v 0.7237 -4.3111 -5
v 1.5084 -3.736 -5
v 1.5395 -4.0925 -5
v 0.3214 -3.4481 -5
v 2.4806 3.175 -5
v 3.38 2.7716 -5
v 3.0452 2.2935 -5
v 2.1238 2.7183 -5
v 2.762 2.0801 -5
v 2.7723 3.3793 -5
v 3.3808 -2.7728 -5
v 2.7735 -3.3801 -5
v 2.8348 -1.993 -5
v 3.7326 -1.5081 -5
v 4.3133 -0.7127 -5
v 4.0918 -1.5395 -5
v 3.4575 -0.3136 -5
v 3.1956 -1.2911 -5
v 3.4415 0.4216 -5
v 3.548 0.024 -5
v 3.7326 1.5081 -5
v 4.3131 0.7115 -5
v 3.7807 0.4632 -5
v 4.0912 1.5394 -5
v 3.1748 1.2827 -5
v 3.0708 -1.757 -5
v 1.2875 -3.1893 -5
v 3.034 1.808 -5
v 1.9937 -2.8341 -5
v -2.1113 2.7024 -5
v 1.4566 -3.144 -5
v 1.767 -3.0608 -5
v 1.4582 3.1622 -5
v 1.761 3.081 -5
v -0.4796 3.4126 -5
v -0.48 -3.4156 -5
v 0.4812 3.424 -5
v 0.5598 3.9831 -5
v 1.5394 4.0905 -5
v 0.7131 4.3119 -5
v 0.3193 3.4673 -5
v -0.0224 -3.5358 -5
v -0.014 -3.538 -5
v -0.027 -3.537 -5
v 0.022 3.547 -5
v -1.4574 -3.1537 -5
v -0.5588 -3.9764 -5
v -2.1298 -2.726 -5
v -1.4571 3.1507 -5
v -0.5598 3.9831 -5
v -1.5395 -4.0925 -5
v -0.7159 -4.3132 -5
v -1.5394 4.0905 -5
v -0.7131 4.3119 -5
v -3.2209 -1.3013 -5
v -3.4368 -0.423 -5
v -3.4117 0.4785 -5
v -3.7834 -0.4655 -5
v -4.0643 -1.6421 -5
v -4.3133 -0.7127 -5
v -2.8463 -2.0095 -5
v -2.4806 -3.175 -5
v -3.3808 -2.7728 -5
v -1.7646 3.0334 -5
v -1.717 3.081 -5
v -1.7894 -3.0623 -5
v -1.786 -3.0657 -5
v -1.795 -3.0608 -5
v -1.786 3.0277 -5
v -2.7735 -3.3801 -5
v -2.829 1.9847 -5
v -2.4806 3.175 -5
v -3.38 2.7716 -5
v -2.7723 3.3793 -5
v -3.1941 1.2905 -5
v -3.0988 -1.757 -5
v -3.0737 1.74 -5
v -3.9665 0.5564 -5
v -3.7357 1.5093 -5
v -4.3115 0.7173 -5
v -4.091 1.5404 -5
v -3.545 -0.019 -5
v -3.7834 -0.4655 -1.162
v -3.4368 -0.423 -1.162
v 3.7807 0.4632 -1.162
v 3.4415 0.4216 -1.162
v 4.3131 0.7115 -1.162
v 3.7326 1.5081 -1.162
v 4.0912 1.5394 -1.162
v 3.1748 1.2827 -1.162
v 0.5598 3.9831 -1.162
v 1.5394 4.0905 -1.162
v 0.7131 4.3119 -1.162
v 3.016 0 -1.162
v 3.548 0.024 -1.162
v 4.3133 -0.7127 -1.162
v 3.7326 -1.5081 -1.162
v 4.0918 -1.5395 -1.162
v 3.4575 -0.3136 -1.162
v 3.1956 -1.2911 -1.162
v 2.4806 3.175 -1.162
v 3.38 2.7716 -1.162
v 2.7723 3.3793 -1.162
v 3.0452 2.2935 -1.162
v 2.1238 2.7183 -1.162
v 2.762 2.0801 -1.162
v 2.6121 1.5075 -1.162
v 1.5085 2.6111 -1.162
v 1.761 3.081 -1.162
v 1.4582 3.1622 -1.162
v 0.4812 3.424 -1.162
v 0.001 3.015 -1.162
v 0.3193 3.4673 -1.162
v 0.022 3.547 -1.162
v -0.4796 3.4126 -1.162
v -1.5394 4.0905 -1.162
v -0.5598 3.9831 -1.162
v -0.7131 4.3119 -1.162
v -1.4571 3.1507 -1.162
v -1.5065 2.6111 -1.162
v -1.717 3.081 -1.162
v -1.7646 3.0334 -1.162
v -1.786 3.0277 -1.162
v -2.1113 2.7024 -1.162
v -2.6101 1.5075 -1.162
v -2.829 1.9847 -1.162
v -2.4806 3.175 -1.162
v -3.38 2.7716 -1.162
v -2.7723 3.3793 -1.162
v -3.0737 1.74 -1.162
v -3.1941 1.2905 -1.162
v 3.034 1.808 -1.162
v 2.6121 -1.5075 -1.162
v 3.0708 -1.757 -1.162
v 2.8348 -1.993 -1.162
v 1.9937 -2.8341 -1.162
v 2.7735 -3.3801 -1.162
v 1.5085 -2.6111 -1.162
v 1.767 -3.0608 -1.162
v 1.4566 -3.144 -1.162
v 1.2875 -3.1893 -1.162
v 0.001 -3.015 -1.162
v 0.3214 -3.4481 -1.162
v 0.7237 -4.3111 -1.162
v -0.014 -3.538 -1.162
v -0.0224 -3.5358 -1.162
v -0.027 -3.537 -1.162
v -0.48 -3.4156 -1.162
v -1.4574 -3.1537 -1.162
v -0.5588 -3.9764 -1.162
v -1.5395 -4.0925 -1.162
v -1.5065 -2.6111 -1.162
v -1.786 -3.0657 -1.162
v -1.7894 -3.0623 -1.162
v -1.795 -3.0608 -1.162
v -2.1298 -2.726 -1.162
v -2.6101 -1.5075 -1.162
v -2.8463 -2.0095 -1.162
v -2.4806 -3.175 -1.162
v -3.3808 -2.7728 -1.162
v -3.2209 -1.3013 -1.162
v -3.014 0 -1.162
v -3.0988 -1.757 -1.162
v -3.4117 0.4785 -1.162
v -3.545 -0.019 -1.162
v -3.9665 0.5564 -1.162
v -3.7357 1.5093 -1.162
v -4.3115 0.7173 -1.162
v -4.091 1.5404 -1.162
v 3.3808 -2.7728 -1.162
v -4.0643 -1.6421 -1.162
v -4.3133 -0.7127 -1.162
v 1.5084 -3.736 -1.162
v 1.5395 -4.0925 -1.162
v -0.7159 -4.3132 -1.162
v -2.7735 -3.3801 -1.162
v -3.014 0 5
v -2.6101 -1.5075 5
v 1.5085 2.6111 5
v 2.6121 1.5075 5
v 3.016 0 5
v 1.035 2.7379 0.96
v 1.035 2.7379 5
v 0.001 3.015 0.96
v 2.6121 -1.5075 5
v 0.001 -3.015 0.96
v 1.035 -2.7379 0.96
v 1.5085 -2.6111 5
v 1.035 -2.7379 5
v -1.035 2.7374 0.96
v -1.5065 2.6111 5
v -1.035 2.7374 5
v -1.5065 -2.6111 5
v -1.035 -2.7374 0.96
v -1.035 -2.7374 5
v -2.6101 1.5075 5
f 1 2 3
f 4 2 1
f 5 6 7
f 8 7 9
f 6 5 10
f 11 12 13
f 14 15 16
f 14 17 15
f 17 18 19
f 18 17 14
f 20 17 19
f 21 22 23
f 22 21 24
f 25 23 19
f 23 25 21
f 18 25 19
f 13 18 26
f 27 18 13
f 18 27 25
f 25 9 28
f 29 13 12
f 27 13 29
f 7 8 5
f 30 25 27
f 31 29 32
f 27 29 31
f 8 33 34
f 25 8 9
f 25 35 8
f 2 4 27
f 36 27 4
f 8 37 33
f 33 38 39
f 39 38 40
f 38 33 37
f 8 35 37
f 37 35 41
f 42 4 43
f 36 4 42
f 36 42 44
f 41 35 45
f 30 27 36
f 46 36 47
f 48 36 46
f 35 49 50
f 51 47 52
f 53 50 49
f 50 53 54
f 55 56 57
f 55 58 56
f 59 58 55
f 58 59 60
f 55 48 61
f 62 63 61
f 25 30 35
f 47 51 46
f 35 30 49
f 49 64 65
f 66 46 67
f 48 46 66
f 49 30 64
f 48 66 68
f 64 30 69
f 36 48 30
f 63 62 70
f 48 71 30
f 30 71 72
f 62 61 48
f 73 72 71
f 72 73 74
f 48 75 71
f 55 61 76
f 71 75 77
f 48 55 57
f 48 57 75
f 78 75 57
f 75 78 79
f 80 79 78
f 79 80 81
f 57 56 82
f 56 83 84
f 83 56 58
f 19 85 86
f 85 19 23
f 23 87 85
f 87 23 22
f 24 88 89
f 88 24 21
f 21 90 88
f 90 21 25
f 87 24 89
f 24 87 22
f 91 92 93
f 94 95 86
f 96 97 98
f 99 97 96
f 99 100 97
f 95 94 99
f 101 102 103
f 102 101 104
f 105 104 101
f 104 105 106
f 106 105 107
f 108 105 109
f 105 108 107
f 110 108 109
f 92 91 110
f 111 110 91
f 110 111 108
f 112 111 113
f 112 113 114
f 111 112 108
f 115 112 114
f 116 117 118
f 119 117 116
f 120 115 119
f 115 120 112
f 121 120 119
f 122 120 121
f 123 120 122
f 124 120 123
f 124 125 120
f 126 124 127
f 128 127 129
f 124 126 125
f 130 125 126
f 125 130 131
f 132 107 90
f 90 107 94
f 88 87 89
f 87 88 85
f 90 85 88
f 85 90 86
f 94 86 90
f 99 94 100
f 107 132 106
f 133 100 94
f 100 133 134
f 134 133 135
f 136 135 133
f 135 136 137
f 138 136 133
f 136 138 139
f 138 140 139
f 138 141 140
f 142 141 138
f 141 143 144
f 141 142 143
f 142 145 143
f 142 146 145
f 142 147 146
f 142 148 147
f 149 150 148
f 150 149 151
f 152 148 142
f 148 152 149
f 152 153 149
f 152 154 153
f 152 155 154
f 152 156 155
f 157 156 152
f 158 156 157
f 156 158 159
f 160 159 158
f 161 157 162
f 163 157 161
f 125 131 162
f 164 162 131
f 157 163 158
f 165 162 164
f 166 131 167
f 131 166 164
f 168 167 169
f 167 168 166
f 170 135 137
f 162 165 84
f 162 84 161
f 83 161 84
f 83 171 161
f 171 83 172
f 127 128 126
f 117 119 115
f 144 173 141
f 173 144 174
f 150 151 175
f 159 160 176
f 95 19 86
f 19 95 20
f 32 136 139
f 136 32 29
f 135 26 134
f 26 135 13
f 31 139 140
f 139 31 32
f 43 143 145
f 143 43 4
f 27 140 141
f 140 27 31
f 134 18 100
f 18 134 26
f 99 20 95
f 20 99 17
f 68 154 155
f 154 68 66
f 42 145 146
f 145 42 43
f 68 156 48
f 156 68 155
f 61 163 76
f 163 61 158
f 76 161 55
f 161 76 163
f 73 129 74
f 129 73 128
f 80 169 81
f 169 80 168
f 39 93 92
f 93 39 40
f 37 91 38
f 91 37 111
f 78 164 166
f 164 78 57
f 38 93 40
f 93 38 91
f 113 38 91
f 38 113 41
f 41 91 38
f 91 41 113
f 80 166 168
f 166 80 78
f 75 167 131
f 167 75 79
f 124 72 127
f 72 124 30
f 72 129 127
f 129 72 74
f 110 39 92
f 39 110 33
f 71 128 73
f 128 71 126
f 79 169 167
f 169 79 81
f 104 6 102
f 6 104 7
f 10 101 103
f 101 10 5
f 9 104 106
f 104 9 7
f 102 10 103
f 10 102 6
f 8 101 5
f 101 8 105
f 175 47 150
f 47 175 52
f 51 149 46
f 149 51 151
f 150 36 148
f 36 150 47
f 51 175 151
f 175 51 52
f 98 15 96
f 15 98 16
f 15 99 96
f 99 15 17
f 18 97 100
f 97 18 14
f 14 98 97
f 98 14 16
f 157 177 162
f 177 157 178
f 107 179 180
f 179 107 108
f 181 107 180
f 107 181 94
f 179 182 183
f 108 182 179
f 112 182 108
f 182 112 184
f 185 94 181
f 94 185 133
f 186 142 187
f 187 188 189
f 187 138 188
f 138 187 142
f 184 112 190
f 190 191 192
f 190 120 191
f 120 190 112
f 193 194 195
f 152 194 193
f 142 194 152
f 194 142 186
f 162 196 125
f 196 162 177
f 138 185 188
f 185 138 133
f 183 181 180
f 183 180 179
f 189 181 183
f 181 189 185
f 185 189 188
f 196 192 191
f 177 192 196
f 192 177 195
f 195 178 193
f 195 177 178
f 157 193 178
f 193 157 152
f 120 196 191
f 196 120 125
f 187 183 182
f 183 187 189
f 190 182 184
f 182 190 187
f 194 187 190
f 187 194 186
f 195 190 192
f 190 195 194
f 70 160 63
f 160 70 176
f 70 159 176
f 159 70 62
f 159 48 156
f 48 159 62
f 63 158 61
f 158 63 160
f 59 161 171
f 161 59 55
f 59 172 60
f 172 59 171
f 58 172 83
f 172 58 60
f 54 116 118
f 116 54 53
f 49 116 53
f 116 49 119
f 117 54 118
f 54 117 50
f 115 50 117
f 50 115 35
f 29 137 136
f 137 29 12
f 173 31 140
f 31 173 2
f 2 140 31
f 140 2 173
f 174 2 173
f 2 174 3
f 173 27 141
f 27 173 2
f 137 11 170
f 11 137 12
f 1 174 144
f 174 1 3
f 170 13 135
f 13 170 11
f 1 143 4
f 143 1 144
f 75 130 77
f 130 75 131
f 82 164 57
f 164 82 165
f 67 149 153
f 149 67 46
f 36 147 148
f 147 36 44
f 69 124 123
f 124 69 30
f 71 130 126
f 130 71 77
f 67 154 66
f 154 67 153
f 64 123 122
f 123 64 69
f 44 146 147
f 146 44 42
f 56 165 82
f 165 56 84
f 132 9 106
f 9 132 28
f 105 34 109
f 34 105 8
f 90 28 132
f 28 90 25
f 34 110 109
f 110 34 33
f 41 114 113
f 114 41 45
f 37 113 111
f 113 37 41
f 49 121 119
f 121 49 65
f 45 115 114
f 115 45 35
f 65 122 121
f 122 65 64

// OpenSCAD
intersection() {
translate([-5.326, -5.326, -6]) cube(size = [10.652, 10.652, 12], center = false);
union() {
intersection() {
union() {
difference() {
translate([0, 0, 0]) sphere(r = 54.3, $fn = 12);
rotate([-180, 0, 7])
translate([-18.1, -18.1, -18.1]) cube(size = [36.2, 18.101, 23.1], center = false);
}
intersection() {
rotate([-180, 0, 25])
translate([-18.1, -18.1, -18.1]) cube(size = [36.2, 19.278, 23.1], center = false);
rotate([-180, 0, 5])
translate([-18.1, -1.177, -18.1]) cube(size = [36.2, 19.278, 36.2], center = false);
}
}
union() {
intersection() {
rotate([-180, 0, 22])
translate([-18.1, 0, -18.1]) cube(size = [36.2, 18.1, 36.2], center = false);
translate([0, -0.001, -5])
cylinder(h = 3.838, r1 = 4.504, r2 = 4.504, center = false, $fn = 12);
}
rotate([-180, 0, 7])
translate([-18.1, 0.001, 1.162]) cube(size = [36.2, 18.099, 3.838], center = false);
}
union() {
difference() {
translate([0, -0.001, -18.1])
cylinder(h = 13.1, r1 = 4.504, r2 = 4.504, center = false, $fn = 12);
translate([0, 0, 0]) sphere(r = 54.3, $fn = 12);
}
intersection() {
translate([-0.014, 0.024, -5])
cylinder(h = 3.838, r1 = 3.562, r2 = 3.562, center = false, $fn = 12);
translate([0, -0.001, -18.1])
cylinder(h = 36.2, r1 = 4.504, r2 = 4.504, center = false, $fn = 12);
}
difference() {
translate([0, -0.001, -18.1])
cylinder(h = 16.938, r1 = 4.504, r2 = 4.504, center = false, $fn = 12);
rotate([-180, 0, 7])
translate([-18.1, 0.001, -18.1]) cube(size = [36.2, 18.099, 36.2], center = false);
}
}
}
intersection() {
difference() {
difference() {
translate([0, -0.001, -5])
cylinder(h = 3.838, r1 = 4.504, r2 = 4.504, center = false, $fn = 12);
translate([5.775, 1.548, -18.1])
cylinder(h = 16.938, r1 = 4.744, r2 = 4.744, center = false, $fn = 12);
}
difference() {
rotate([0, 0, -8])
translate([-18.1, -0.001, -5]) cube(size = [18.1, 18.101, 3.838], center = false);
rotate([0, 0, -25])
translate([-18.1, -1.172, -5]) cube(size = [16.924, 19.272, 3.838], center = false);
}
}
difference() {
union() {
difference() {
translate([-9.487, -0.001, -5])
cylinder(h = 3.838, r1 = 8.765, r2 = 8.765, center = false, $fn = 12);
translate([-8.309, -4.804, -5])
cylinder(h = 3.838, r1 = 8.869, r2 = 8.869, center = false, $fn = 12);
}
rotate([0, 0, -22])
translate([-18.1, -18.1, -18.1]) cube(size = [36.2, 18.1, 16.938], center = false);
rotate([0, 0, -25])
translate([-1.176, -1.172, -18.1]) cube(size = [19.276, 19.272, 16.938], center = false);
}
union() {
intersection() {
rotate([-180, 0, 38])
translate([0, -18.1, -18.1]) cube(size = [18.1, 36.2, 23.1], center = false);
translate([-9.487, -0.001, -5])
cylinder(h = 23.1, r1 = 8.765, r2 = 8.765, center = false, $fn = 12);
}
intersection() {
rotate([0, 0, -35])
translate([-18.1, 1.178, -5]) cube(size = [36.2, 16.922, 23.1], center = false);
rotate([-180, 0, 5])
translate([-18.1, -18.1, 1.162]) cube(size = [16.923, 36.2, 3.838], center = false);
}
}
}
union() {
intersection() {
rotate([0, 0, -5])
translate([-18.1, -18.1, -18.1]) cube(size = [19.277, 36.2, 16.938], center = false);
rotate([-180, 0, 35])
translate([-1.179, -18.1, 1.162]) cube(size = [19.279, 36.2, 3.838], center = false);
}
intersection() {
rotate([0, 0, -8])
translate([-18.1, -0.001, -18.1]) cube(size = [18.1, 18.101, 36.2], center = false);
rotate([0, 0, -5])
translate([-18.1, -18.1, -5]) cube(size = [19.277, 19.278, 23.1], center = false);
}
}
}
translate([-0.027, -0.019, -5])
cylinder(h = 3.838, r1 = 3.518, r2 = 3.518, center = false, $fn = 12);
intersection() {
rotate([0, 0, -38])
translate([0, -18.1, -5]) cube(size = [18.1, 36.2, 3.838], center = false);
difference() {
translate([0, -0.001, -5])
cylinder(h = 3.838, r1 = 4.504, r2 = 4.504, center = false, $fn = 12);
union() {
rotate([0, 0, -35])
translate([1.179, -18.1, -18.1]) cube(size = [16.921, 36.2, 36.2], center = false);
rotate([-180, 0, 35])
translate([-18.1, -18.1, -18.1]) cube(size = [36.2, 16.922, 36.2], center = false);
rotate([-180, 0, 37])
translate([-18.1, 0.001, 1.162]) cube(size = [36.2, 18.099, 3.838], center = false);
}
}
}
intersection() {
difference() {
difference() {
rotate([0, 0, -25])
translate([-18.1, -18.1, -5]) cube(size = [19.274, 19.277, 3.838], center = false);
rotate([0, 0, -5])
translate([-18.1, -18.1, -18.1]) cube(size = [16.923, 36.2, 36.2], center = false);
}
union() {
translate([-9.487, -0.001, -18.1])
cylinder(h = 16.938, r1 = 8.765, r2 = 8.765, center = false, $fn = 12);
rotate([0, 0, -8])
translate([0, -18.1, -5]) cube(size = [18.1, 36.2, 23.1], center = false);
}
}
translate([0, -0.001, -5])
cylinder(h = 23.1, r1 = 4.504, r2 = 4.504, center = false, $fn = 12);
}
intersection() {
rotate([0, 0, -22])
translate([-18.1, 0, -18.1]) cube(size = [36.2, 18.1, 36.2], center = false);
difference() {
difference() {
translate([0, -0.001, -5])
cylinder(h = 3.838, r1 = 4.504, r2 = 4.504, center = false, $fn = 12);
rotate([0, 0, -25])
translate([-18.1, 1.177, -18.1]) cube(size = [36.2, 16.923, 36.2], center = false);
}
difference() {
rotate([0, 0, -35])
translate([-18.1, -1.178, -5]) cube(size = [36.2, 19.278, 3.838], center = false);
rotate([-180, 0, 5])
translate([1.177, -18.1, 1.162]) cube(size = [16.923, 36.2, 16.938], center = false);
}
}
rotate([0, 0, -5])
translate([-18.1, -1.177, -5]) cube(size = [36.2, 19.278, 23.1], center = false);
}
difference() {
translate([0.001, 0, -1.162])
cylinder(h = 6.162, r1 = 3.015, r2 = 3.015, center = false, $fn = 12);
translate([-1.035, -18.1, 0.96]) cube(size = [2.07, 36.2, 17.14], center = false);
}
difference() {
translate([0, -0.001, -5])
cylinder(h = 3.838, r1 = 4.504, r2 = 4.504, center = false, $fn = 12);
difference() {
union() {
rotate([-180, 0, 5])
translate([-18.1, -18.1, -18.1]) cube(size = [36.2, 19.278, 23.1], center = false);
intersection() {
translate([0, -0.001, -18.1])
cylinder(h = 36.2, r1 = 4.504, r2 = 4.504, center = false, $fn = 12);
rotate([-180, 0, 35])
translate([-18.1, 1.178, -18.1]) cube(size = [36.2, 16.922, 36.2], center = false);
}
rotate([0, 0, -38])
translate([0, -18.1, -5]) cube(size = [18.1, 36.2, 23.1], center = false);
rotate([0, 0, -35])
translate([-18.1, -18.1, -18.1]) cube(size = [16.921, 36.2, 36.2], center = false);
}
intersection() {
rotate([-180, 0, 22])
translate([-18.1, -18.1, 1.162]) cube(size = [36.2, 18.1, 3.838], center = false);
rotate([-180, 0, 7])
translate([-18.1, 0.001, -18.1]) cube(size = [36.2, 18.099, 36.2], center = false);
rotate([-180, 0, 7])
translate([-18.1, 0.001, -18.1]) cube(size = [36.2, 18.099, 23.1], center = false);
translate([0, -0.001, -18.1])
cylinder(h = 16.938, r1 = 4.504, r2 = 4.504, center = false, $fn = 12);
rotate([-180, 0, 25])
translate([-18.1, -1.177, -18.1]) cube(size = [36.2, 19.278, 36.2], center = false);
}
}
}
difference() {
intersection() {
difference() {
translate([0, -0.001, -5])
cylinder(h = 3.838, r1 = 4.504, r2 = 4.504, center = false, $fn = 12);
rotate([0, 0, -8])
translate([-18.1, -18.1, -18.1]) cube(size = [36.2, 18.099, 36.2], center = false);
}
rotate([-180, 0, 25])
translate([-18.1, -18.1, 1.162]) cube(size = [19.276, 36.2, 3.838], center = false);
difference() {
rotate([-180, 0, 5])
translate([-1.177, -18.1, -18.1]) cube(size = [19.277, 36.2, 36.2], center = false);
translate([-9.487, -0.001, -5])
cylinder(h = 23.1, r1 = 8.765, r2 = 8.765, center = false, $fn = 12);
}
}
rotate([-180, 0, 8])
translate([0, -18.1, -18.1]) cube(size = [18.1, 36.2, 23.1], center = false);
}
translate([0.022, 0.069, -5])
cylinder(h = 3.838, r1 = 3.478, r2 = 3.478, center = false, $fn = 12);
difference() {
intersection() {
union() {
translate([-0.014, 0.024, -18.1])
cylinder(h = 16.938, r1 = 3.562, r2 = 3.562, center = false, $fn = 12);
rotate([-180, 0, 5])
translate([-18.1, -18.1, -18.1]) cube(size = [19.277, 36.2, 23.1], center = false);
difference() {
rotate([0, 0, -35])
translate([-18.1, -1.178, -18.1]) cube(size = [36.2, 19.278, 36.2], center = false);
translate([5.775, 1.548, -18.1])
cylinder(h = 16.938, r1 = 4.744, r2 = 4.744, center = false, $fn = 12);
}
}
union() {
rotate([-180, 0, 5])
translate([1.177, -18.1, 1.162]) cube(size = [16.923, 36.2, 3.838], center = false);
rotate([-180, 0, 22])
translate([-18.1, -18.1, 1.162]) cube(size = [18.099, 36.2, 3.838], center = false);
}
difference() {
translate([0, -0.001, -18.1])
cylinder(h = 36.2, r1 = 4.504, r2 = 4.504, center = false, $fn = 12);
translate([-9.487, -0.001, -18.1])
cylinder(h = 36.2, r1 = 8.765, r2 = 8.765, center = false, $fn = 12);
}
}
union() {
rotate([0, 0, -22])
translate([-18.1, 0, -18.1]) cube(size = [36.2, 18.1, 36.2], center = false);
difference() {
rotate([-180, 0, 35])
translate([1.179, -18.1, 1.162]) cube(size = [16.921, 36.2, 16.938], center = false);
translate([-0.014, 0.024, -5])
cylinder(h = 3.838, r1 = 3.562, r2 = 3.562, center = false, $fn = 12);
}
rotate([-180, 0, 25])
translate([-18.1, -18.1, -18.1]) cube(size = [16.934, 36.2, 36.2], center = false);
translate([-8.309, -4.804, -18.1])
cylinder(h = 16.938, r1 = 8.869, r2 = 8.869, center = false, $fn = 12);
}
}
}
}
